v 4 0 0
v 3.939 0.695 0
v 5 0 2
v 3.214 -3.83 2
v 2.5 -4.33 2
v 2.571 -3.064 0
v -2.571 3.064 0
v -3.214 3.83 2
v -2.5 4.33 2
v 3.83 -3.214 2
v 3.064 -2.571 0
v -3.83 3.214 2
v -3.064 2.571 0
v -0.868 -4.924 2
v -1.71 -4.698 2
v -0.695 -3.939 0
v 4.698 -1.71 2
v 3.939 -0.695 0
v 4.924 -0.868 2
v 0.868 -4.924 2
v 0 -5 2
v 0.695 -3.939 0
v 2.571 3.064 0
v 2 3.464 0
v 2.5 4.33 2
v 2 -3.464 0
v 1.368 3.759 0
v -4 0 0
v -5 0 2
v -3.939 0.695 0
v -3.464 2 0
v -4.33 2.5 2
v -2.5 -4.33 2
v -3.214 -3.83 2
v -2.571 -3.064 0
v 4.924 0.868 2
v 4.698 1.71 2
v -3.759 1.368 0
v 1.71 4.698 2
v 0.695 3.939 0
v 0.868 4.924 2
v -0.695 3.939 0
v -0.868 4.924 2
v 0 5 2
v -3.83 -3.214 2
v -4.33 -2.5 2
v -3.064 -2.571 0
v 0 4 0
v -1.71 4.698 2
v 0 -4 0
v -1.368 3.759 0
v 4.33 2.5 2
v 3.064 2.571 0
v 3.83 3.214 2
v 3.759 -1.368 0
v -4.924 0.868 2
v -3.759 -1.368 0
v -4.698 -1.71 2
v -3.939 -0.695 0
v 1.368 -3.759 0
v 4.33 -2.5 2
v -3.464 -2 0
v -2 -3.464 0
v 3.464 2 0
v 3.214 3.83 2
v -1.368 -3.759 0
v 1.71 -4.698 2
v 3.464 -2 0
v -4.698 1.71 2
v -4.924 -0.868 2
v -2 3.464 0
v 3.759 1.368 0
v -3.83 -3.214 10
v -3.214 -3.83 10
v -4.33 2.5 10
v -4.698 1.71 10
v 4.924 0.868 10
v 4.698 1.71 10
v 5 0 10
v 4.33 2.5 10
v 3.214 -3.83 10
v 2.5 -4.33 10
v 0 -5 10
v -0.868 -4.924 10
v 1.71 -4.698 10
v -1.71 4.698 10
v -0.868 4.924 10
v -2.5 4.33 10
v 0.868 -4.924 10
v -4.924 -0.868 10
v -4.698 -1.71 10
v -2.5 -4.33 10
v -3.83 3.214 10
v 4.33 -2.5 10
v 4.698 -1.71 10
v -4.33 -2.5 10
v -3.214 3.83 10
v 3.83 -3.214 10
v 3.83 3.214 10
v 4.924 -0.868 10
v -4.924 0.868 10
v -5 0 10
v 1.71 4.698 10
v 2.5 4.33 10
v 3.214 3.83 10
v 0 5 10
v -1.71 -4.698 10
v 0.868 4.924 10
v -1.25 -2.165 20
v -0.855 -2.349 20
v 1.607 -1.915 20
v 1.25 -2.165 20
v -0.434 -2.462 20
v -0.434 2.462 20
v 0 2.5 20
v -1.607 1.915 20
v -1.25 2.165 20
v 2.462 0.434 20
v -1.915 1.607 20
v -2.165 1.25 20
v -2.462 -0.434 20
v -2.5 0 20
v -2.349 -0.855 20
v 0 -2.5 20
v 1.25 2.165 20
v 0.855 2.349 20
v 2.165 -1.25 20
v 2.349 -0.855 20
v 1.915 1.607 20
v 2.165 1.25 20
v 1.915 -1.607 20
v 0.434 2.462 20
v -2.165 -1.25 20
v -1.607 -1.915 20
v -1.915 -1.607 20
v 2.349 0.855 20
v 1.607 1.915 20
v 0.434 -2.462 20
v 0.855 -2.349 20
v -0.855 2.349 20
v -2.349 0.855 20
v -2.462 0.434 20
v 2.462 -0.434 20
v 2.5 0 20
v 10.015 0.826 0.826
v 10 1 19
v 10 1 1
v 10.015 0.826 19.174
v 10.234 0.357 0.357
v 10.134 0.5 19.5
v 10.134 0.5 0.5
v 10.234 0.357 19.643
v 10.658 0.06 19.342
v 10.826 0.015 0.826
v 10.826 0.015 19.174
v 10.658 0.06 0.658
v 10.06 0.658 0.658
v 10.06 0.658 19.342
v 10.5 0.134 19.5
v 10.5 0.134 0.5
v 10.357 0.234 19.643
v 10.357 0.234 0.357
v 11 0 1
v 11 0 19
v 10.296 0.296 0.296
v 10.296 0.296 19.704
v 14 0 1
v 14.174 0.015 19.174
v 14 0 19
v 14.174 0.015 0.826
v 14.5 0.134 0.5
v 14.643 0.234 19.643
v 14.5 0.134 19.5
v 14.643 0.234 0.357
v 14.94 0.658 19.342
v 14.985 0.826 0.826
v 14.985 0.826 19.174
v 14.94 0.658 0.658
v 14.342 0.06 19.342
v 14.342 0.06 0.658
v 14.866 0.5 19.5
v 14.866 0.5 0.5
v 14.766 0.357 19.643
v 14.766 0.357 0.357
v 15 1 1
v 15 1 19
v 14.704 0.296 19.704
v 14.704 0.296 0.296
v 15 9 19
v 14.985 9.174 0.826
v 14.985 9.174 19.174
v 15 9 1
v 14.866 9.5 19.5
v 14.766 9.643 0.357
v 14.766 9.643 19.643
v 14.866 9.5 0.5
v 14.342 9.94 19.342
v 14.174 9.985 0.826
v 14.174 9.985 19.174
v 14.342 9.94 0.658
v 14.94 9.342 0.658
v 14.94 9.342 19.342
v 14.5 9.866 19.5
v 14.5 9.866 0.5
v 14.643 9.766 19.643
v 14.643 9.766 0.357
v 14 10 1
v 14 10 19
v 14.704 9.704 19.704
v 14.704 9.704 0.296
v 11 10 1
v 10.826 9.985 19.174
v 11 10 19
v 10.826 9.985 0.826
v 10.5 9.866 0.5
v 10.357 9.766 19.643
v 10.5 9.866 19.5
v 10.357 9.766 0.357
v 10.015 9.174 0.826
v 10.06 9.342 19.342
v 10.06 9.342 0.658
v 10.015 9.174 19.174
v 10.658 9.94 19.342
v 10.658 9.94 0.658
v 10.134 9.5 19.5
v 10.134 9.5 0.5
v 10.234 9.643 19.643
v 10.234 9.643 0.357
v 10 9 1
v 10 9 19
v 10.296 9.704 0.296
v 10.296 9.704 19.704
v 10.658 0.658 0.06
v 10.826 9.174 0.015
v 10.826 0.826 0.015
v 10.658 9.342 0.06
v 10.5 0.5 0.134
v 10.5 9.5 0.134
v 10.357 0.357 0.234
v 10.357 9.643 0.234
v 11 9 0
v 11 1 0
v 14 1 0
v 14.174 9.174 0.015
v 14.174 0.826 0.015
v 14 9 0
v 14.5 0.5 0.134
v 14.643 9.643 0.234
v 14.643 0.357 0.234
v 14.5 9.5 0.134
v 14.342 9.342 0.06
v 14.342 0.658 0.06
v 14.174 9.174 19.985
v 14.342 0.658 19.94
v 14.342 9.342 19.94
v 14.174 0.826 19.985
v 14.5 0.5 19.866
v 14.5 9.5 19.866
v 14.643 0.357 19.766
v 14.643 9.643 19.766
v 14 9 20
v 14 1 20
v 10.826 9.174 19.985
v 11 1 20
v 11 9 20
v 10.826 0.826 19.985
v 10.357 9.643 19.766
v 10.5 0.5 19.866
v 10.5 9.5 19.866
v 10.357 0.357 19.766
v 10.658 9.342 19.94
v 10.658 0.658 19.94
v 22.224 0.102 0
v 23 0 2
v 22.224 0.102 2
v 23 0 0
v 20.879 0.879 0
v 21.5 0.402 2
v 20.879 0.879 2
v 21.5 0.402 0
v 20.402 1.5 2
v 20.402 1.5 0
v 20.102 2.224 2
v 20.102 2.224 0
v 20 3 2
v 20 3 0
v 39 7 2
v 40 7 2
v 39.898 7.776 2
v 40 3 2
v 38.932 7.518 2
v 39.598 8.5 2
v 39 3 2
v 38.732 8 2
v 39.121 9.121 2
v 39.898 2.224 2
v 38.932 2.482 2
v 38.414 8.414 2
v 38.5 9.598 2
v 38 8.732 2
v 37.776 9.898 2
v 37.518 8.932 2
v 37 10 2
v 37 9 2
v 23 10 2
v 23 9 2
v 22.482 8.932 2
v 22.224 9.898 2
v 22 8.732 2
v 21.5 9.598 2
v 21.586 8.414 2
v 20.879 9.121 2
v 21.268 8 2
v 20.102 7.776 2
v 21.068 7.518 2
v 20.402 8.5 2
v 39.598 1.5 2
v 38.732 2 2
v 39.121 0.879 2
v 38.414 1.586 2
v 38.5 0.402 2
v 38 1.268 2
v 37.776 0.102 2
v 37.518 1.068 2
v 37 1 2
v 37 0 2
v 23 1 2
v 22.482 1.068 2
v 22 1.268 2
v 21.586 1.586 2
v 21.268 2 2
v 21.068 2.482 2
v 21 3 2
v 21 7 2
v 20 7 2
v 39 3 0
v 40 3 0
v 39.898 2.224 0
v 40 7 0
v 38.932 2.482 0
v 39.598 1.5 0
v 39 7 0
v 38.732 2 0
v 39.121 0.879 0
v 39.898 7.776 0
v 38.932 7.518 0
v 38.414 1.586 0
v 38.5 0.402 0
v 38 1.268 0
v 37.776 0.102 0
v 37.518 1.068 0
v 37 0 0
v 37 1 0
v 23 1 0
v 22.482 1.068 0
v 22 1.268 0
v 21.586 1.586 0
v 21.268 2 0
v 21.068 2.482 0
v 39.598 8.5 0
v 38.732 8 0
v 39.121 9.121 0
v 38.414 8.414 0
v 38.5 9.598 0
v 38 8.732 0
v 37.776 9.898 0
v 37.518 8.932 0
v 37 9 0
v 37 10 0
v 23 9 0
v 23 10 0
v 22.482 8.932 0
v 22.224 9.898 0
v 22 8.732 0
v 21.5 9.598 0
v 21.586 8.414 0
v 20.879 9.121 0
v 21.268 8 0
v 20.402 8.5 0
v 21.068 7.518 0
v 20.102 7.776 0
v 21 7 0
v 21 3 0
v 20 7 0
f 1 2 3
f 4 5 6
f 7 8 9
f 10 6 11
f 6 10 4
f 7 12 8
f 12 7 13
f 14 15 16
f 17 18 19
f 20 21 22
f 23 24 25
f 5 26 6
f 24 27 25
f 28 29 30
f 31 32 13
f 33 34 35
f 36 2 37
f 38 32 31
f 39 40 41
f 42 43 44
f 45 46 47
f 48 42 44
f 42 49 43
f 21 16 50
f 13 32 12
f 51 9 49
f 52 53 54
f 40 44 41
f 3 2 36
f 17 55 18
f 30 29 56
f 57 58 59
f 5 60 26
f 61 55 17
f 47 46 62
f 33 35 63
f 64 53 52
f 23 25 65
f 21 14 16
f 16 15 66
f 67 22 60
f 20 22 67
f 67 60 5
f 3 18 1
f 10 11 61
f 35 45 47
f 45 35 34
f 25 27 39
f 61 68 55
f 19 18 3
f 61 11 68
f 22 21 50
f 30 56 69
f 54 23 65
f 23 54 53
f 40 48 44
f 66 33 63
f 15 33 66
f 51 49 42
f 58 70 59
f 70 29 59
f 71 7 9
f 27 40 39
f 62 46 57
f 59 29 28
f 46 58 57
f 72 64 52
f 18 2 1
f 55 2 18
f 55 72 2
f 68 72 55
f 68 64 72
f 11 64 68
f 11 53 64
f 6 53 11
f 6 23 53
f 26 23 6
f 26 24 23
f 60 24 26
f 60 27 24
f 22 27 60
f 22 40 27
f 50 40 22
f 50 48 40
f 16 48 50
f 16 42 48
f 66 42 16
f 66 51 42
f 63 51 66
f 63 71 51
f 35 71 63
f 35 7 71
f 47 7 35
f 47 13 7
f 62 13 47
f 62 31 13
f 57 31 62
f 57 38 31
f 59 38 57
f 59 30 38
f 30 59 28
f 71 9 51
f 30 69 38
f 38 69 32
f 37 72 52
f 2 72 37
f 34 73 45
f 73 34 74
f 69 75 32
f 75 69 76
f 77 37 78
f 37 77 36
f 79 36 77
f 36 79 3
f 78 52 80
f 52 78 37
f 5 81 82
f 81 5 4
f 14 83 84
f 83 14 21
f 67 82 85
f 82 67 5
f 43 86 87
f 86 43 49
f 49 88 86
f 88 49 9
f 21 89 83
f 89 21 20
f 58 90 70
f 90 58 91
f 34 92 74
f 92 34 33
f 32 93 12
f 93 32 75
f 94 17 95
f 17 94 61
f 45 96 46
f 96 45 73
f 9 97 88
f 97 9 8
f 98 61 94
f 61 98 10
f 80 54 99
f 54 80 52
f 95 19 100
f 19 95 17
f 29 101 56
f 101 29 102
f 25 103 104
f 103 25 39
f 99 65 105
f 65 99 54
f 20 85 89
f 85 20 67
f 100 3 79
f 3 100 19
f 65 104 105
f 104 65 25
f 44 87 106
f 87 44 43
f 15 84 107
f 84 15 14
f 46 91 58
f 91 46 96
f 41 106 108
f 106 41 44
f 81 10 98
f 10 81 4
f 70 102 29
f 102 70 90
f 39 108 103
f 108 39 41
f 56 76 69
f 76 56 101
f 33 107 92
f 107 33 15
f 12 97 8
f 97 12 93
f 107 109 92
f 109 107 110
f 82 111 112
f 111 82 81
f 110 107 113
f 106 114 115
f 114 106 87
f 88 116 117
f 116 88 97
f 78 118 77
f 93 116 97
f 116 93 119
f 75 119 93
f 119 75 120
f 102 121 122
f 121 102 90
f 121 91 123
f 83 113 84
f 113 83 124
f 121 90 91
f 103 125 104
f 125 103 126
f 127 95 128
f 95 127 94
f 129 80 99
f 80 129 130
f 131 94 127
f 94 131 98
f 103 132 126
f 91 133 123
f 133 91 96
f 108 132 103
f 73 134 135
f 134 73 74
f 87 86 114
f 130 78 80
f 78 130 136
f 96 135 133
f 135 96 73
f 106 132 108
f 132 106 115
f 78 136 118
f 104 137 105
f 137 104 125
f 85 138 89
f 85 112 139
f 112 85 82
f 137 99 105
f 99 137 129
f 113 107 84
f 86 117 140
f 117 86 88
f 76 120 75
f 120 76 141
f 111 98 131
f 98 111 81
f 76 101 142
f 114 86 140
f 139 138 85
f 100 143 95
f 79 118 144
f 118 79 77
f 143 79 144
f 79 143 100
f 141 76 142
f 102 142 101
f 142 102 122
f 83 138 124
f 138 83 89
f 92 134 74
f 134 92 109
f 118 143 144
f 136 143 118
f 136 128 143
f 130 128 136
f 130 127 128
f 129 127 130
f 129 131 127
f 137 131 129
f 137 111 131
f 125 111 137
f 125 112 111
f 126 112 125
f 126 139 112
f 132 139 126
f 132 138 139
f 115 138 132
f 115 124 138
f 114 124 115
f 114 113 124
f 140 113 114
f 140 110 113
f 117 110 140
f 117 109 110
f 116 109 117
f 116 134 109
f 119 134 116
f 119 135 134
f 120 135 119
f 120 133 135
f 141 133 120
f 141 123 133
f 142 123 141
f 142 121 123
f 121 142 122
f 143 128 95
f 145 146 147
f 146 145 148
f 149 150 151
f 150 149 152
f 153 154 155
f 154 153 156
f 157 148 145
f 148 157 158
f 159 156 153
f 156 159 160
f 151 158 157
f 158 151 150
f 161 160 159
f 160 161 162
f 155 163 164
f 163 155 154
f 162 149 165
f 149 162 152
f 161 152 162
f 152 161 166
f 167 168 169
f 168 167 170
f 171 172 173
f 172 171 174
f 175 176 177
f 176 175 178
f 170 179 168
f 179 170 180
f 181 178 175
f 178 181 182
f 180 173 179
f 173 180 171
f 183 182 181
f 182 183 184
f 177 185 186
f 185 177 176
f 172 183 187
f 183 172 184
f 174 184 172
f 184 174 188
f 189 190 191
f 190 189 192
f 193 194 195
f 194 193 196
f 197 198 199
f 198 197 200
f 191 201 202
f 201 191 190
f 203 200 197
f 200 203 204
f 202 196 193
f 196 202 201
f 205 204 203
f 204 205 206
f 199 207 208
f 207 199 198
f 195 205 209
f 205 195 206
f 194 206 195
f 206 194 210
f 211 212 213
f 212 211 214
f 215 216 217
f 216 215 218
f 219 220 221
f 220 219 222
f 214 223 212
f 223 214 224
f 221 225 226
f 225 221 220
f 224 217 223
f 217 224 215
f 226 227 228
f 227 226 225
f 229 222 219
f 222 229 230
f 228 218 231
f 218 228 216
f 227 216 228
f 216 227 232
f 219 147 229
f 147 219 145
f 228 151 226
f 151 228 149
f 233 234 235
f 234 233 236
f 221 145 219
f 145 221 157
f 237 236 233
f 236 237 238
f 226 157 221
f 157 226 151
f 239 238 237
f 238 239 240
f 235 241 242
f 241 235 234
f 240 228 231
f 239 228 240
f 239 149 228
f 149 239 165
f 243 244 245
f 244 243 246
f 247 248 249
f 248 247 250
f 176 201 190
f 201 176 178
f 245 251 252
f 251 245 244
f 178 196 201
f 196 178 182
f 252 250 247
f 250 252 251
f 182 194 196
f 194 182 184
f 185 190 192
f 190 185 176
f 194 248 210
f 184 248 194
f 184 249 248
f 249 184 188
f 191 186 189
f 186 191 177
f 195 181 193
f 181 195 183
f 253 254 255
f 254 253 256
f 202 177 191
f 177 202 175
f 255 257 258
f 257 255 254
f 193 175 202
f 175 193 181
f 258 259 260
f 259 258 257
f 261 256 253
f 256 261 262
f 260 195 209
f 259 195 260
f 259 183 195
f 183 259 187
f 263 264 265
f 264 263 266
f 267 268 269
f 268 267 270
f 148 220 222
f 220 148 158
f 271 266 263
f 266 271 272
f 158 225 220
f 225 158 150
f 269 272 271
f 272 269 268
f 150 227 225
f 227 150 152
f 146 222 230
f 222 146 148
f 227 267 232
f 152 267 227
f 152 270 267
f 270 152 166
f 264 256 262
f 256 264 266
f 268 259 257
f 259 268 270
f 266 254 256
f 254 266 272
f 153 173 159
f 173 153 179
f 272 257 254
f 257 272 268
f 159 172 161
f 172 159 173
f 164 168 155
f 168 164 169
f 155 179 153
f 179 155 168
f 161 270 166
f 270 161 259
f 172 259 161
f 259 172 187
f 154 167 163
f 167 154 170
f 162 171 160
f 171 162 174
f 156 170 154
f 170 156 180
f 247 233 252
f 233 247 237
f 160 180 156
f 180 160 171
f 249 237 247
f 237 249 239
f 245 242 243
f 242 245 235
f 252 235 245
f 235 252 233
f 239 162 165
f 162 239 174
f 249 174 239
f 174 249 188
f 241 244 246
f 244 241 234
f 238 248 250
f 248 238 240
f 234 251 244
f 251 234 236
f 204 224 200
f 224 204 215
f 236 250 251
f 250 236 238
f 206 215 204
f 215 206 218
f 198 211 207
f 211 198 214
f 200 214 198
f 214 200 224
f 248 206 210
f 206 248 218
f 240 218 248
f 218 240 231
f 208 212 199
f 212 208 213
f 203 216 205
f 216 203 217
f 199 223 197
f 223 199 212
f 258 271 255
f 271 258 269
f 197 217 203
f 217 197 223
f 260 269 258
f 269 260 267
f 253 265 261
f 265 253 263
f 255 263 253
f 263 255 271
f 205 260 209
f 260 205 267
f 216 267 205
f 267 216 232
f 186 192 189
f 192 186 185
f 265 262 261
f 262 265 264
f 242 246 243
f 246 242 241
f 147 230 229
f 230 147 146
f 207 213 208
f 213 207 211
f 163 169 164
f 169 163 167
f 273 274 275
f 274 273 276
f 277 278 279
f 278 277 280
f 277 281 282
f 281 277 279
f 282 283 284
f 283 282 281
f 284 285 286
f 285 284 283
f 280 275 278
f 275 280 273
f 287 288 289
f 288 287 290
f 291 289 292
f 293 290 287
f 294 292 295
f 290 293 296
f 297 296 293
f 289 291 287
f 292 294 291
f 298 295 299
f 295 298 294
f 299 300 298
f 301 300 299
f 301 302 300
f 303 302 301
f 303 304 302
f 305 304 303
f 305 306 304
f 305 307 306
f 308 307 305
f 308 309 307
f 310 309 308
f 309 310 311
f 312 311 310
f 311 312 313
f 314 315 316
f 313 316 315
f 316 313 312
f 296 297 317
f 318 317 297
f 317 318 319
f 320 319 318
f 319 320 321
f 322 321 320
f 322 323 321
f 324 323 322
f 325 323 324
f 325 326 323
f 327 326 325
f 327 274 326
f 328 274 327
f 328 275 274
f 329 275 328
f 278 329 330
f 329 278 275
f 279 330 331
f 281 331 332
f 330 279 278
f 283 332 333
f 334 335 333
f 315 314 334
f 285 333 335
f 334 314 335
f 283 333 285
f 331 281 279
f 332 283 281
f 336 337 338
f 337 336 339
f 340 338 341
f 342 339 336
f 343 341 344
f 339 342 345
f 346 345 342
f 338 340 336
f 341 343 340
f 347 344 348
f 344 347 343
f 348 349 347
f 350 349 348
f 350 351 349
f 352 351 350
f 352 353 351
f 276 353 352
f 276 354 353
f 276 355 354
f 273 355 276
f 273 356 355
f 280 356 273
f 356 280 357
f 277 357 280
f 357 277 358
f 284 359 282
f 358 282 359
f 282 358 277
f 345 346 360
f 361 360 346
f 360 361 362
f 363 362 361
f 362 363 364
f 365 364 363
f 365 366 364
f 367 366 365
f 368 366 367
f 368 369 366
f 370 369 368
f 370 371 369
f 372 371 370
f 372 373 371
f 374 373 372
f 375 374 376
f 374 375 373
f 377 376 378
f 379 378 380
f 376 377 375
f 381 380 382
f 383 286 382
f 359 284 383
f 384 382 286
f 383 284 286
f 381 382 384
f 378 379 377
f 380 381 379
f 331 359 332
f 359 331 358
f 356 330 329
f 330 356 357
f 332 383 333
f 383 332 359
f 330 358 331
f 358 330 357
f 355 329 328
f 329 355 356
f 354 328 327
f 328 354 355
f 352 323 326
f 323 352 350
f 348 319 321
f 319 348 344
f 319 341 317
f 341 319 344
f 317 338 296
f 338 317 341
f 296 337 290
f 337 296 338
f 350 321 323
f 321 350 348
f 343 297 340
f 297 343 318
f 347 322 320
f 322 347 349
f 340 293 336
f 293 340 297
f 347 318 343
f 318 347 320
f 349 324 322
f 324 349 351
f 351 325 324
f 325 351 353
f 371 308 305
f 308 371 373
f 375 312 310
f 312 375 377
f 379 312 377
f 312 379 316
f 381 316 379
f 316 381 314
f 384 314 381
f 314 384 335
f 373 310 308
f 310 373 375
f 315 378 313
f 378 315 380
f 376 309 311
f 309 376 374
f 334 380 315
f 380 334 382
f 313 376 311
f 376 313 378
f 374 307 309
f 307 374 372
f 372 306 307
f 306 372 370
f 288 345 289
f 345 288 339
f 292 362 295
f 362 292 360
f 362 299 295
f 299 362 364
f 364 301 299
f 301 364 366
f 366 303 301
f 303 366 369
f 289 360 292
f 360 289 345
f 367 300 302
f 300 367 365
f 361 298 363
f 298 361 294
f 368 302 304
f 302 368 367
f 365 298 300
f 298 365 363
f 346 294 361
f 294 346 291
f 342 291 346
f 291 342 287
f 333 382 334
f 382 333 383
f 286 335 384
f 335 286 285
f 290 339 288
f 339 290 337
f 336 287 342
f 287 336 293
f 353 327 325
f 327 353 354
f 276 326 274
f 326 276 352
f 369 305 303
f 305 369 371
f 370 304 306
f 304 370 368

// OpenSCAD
// modules not related to bricks

// --  rounded cylinder ---------------------------------------------------------------------------------------

// produces a cylinder in 3 sections
// d: base diameter
// h: total height
// rt: top section height
// rtw: top section diameter difference
// rb: bottom section height
// rbw: bottom section diameter difference
module rounded_cylinder(d,h,rt,rtw,rb,rbw,fn=36){
    cylinder(d2=d,d1=d-rbw,h=rb,$fn=fn);
    translate([0,0,rb])
    cylinder(d=d,h=h-rb-rt,$fn=fn);
    translate([0,0,h-rt])
    cylinder(d1=d,d2=d-rtw,h=rt,$fn=fn);    
}


// -- roundedcube ----------------------------------------------------------------------------------------------



// rounded cube --
// original idea:
// https://stackoverflow.com/questions/33146741/way-to-round-edges-of-objects-openscad


module __neg_round_edge(height,radius,fn=36){
  difference(){
    translate([-.5,-.5,0])
      cube([radius+.5,radius+.5,height]);
      translate([radius,radius,height/2+1]) cylinder(height+3,radius,radius,true,$fn=fn);
   }
}


module __neg_round_edges(xx,yy,zz,radius,cf=[1,1,1,1]){
  if (cf[0]>0) 
    __neg_round_edge(zz,cf[0]*radius);  
  if (cf[1]>0) 
    translate([xx,0,0]) rotate([0,0,90]) __neg_round_edge(zz,cf[1]*radius);  
  if (cf[2]>0) 
     translate([xx,yy,0]) rotate([0,0,180]) __neg_round_edge(zz,cf[2]*radius);  
  if (cf[3]>0) 
     translate([0,yy,0]) rotate([0,0,270]) __neg_round_edge(zz,cf[3]*radius);      
}

module __neg_rounded_cube(xx, yy, zz, radius,top=true,bottom=true,x=[1,1,1,1],y=[1,1,1,1],z=[1,1,1,1]) {
     __neg_round_edges(xx,yy,zz,radius,x);
    translate([0,yy,0]) rotate([90,0,0]) __neg_round_edges(xx,zz,yy,radius,y);
    translate([0,0,zz]) rotate([0,90,0]) __neg_round_edges(zz,yy,xx,radius,x);
}



// produces a cube with round corners
// xx:width
// yy:length
// zz:depth
// radius: radius of the corners
// z,y,z: allow to turn off rounding for some specific corners TODO remove
module rounded_cube(xx, yy, zz, radius,x=[1,1,1,1],y=[1,1,1,1],z=[1,1,1,1]) {
  difference(){
    cube([xx,yy,zz]);
    __neg_rounded_cube(xx,yy,zz,radius,x,y,z);
  }
}



// -- rounded_square_tube -----------------------------------------------------------------------------------

// produces a vertical square tube with rounded corners
// params:
// w:width
// l:length
// h:height
// t:thickness of wall
// r:radius of rounded corner
// fill: whether it is empty or not

module rounded_square_tube(w,l,h,t,r,fill=false){

  
  __roundedcorner(r,h,t,fill=fill);
    
  translate([w,0,0]) mirror([1,0,0]) __roundedcorner(r,h,t,fill=fill);
    
  translate([0,l,0]) mirror([0,1,0]) __roundedcorner(r,h,t,fill=fill);
  translate([w,l,0]) mirror([1,1,0]) __roundedcorner(r,h,t,fill=fill);
    
  if (fill){
    translate([r,0,0]) cube([w-r-r,l,h]);
    translate([0,r,0]) cube([w,l-r-r,h]);
  } else {
    translate([0,r,0]) cube([t,l-r-r,h]);
    translate([w-t,r,0]) cube([t,l-r-r,h]);
    translate([r,0,0]) cube([w-r-r,t,h]);
    translate([r,l-t,0]) cube([w-r-r,t,h]);
  }
}

// just a single rounded corner
// r: radiuse
// h:height
// t:thickness
// fill: if true t is ignored and the inner part of the curve is filled
module __roundedcorner(r,h,t,fill=false){

  intersection(){
    cube([r,r,h]);
    translate([r,r,0]){

    difference(){
        cylinder(d=r+r,h=h,$fn=24);
        if (!fill)
            translate([0,0,-1]) cylinder(d=r+r-t-t,h=h+2,$fn=24);
      }
    }
  }
}


// tests
translate([0,0,0]) rounded_cylinder(d=10,h=20,rt=10,rtw=5,rb=2,rbw=2);
translate([10,0,0]) rounded_cube(xx=5,yy=10,zz=20,radius=1);
translate([20,0,0])  rounded_square_tube(20,10,2,1,3,fill=false);
